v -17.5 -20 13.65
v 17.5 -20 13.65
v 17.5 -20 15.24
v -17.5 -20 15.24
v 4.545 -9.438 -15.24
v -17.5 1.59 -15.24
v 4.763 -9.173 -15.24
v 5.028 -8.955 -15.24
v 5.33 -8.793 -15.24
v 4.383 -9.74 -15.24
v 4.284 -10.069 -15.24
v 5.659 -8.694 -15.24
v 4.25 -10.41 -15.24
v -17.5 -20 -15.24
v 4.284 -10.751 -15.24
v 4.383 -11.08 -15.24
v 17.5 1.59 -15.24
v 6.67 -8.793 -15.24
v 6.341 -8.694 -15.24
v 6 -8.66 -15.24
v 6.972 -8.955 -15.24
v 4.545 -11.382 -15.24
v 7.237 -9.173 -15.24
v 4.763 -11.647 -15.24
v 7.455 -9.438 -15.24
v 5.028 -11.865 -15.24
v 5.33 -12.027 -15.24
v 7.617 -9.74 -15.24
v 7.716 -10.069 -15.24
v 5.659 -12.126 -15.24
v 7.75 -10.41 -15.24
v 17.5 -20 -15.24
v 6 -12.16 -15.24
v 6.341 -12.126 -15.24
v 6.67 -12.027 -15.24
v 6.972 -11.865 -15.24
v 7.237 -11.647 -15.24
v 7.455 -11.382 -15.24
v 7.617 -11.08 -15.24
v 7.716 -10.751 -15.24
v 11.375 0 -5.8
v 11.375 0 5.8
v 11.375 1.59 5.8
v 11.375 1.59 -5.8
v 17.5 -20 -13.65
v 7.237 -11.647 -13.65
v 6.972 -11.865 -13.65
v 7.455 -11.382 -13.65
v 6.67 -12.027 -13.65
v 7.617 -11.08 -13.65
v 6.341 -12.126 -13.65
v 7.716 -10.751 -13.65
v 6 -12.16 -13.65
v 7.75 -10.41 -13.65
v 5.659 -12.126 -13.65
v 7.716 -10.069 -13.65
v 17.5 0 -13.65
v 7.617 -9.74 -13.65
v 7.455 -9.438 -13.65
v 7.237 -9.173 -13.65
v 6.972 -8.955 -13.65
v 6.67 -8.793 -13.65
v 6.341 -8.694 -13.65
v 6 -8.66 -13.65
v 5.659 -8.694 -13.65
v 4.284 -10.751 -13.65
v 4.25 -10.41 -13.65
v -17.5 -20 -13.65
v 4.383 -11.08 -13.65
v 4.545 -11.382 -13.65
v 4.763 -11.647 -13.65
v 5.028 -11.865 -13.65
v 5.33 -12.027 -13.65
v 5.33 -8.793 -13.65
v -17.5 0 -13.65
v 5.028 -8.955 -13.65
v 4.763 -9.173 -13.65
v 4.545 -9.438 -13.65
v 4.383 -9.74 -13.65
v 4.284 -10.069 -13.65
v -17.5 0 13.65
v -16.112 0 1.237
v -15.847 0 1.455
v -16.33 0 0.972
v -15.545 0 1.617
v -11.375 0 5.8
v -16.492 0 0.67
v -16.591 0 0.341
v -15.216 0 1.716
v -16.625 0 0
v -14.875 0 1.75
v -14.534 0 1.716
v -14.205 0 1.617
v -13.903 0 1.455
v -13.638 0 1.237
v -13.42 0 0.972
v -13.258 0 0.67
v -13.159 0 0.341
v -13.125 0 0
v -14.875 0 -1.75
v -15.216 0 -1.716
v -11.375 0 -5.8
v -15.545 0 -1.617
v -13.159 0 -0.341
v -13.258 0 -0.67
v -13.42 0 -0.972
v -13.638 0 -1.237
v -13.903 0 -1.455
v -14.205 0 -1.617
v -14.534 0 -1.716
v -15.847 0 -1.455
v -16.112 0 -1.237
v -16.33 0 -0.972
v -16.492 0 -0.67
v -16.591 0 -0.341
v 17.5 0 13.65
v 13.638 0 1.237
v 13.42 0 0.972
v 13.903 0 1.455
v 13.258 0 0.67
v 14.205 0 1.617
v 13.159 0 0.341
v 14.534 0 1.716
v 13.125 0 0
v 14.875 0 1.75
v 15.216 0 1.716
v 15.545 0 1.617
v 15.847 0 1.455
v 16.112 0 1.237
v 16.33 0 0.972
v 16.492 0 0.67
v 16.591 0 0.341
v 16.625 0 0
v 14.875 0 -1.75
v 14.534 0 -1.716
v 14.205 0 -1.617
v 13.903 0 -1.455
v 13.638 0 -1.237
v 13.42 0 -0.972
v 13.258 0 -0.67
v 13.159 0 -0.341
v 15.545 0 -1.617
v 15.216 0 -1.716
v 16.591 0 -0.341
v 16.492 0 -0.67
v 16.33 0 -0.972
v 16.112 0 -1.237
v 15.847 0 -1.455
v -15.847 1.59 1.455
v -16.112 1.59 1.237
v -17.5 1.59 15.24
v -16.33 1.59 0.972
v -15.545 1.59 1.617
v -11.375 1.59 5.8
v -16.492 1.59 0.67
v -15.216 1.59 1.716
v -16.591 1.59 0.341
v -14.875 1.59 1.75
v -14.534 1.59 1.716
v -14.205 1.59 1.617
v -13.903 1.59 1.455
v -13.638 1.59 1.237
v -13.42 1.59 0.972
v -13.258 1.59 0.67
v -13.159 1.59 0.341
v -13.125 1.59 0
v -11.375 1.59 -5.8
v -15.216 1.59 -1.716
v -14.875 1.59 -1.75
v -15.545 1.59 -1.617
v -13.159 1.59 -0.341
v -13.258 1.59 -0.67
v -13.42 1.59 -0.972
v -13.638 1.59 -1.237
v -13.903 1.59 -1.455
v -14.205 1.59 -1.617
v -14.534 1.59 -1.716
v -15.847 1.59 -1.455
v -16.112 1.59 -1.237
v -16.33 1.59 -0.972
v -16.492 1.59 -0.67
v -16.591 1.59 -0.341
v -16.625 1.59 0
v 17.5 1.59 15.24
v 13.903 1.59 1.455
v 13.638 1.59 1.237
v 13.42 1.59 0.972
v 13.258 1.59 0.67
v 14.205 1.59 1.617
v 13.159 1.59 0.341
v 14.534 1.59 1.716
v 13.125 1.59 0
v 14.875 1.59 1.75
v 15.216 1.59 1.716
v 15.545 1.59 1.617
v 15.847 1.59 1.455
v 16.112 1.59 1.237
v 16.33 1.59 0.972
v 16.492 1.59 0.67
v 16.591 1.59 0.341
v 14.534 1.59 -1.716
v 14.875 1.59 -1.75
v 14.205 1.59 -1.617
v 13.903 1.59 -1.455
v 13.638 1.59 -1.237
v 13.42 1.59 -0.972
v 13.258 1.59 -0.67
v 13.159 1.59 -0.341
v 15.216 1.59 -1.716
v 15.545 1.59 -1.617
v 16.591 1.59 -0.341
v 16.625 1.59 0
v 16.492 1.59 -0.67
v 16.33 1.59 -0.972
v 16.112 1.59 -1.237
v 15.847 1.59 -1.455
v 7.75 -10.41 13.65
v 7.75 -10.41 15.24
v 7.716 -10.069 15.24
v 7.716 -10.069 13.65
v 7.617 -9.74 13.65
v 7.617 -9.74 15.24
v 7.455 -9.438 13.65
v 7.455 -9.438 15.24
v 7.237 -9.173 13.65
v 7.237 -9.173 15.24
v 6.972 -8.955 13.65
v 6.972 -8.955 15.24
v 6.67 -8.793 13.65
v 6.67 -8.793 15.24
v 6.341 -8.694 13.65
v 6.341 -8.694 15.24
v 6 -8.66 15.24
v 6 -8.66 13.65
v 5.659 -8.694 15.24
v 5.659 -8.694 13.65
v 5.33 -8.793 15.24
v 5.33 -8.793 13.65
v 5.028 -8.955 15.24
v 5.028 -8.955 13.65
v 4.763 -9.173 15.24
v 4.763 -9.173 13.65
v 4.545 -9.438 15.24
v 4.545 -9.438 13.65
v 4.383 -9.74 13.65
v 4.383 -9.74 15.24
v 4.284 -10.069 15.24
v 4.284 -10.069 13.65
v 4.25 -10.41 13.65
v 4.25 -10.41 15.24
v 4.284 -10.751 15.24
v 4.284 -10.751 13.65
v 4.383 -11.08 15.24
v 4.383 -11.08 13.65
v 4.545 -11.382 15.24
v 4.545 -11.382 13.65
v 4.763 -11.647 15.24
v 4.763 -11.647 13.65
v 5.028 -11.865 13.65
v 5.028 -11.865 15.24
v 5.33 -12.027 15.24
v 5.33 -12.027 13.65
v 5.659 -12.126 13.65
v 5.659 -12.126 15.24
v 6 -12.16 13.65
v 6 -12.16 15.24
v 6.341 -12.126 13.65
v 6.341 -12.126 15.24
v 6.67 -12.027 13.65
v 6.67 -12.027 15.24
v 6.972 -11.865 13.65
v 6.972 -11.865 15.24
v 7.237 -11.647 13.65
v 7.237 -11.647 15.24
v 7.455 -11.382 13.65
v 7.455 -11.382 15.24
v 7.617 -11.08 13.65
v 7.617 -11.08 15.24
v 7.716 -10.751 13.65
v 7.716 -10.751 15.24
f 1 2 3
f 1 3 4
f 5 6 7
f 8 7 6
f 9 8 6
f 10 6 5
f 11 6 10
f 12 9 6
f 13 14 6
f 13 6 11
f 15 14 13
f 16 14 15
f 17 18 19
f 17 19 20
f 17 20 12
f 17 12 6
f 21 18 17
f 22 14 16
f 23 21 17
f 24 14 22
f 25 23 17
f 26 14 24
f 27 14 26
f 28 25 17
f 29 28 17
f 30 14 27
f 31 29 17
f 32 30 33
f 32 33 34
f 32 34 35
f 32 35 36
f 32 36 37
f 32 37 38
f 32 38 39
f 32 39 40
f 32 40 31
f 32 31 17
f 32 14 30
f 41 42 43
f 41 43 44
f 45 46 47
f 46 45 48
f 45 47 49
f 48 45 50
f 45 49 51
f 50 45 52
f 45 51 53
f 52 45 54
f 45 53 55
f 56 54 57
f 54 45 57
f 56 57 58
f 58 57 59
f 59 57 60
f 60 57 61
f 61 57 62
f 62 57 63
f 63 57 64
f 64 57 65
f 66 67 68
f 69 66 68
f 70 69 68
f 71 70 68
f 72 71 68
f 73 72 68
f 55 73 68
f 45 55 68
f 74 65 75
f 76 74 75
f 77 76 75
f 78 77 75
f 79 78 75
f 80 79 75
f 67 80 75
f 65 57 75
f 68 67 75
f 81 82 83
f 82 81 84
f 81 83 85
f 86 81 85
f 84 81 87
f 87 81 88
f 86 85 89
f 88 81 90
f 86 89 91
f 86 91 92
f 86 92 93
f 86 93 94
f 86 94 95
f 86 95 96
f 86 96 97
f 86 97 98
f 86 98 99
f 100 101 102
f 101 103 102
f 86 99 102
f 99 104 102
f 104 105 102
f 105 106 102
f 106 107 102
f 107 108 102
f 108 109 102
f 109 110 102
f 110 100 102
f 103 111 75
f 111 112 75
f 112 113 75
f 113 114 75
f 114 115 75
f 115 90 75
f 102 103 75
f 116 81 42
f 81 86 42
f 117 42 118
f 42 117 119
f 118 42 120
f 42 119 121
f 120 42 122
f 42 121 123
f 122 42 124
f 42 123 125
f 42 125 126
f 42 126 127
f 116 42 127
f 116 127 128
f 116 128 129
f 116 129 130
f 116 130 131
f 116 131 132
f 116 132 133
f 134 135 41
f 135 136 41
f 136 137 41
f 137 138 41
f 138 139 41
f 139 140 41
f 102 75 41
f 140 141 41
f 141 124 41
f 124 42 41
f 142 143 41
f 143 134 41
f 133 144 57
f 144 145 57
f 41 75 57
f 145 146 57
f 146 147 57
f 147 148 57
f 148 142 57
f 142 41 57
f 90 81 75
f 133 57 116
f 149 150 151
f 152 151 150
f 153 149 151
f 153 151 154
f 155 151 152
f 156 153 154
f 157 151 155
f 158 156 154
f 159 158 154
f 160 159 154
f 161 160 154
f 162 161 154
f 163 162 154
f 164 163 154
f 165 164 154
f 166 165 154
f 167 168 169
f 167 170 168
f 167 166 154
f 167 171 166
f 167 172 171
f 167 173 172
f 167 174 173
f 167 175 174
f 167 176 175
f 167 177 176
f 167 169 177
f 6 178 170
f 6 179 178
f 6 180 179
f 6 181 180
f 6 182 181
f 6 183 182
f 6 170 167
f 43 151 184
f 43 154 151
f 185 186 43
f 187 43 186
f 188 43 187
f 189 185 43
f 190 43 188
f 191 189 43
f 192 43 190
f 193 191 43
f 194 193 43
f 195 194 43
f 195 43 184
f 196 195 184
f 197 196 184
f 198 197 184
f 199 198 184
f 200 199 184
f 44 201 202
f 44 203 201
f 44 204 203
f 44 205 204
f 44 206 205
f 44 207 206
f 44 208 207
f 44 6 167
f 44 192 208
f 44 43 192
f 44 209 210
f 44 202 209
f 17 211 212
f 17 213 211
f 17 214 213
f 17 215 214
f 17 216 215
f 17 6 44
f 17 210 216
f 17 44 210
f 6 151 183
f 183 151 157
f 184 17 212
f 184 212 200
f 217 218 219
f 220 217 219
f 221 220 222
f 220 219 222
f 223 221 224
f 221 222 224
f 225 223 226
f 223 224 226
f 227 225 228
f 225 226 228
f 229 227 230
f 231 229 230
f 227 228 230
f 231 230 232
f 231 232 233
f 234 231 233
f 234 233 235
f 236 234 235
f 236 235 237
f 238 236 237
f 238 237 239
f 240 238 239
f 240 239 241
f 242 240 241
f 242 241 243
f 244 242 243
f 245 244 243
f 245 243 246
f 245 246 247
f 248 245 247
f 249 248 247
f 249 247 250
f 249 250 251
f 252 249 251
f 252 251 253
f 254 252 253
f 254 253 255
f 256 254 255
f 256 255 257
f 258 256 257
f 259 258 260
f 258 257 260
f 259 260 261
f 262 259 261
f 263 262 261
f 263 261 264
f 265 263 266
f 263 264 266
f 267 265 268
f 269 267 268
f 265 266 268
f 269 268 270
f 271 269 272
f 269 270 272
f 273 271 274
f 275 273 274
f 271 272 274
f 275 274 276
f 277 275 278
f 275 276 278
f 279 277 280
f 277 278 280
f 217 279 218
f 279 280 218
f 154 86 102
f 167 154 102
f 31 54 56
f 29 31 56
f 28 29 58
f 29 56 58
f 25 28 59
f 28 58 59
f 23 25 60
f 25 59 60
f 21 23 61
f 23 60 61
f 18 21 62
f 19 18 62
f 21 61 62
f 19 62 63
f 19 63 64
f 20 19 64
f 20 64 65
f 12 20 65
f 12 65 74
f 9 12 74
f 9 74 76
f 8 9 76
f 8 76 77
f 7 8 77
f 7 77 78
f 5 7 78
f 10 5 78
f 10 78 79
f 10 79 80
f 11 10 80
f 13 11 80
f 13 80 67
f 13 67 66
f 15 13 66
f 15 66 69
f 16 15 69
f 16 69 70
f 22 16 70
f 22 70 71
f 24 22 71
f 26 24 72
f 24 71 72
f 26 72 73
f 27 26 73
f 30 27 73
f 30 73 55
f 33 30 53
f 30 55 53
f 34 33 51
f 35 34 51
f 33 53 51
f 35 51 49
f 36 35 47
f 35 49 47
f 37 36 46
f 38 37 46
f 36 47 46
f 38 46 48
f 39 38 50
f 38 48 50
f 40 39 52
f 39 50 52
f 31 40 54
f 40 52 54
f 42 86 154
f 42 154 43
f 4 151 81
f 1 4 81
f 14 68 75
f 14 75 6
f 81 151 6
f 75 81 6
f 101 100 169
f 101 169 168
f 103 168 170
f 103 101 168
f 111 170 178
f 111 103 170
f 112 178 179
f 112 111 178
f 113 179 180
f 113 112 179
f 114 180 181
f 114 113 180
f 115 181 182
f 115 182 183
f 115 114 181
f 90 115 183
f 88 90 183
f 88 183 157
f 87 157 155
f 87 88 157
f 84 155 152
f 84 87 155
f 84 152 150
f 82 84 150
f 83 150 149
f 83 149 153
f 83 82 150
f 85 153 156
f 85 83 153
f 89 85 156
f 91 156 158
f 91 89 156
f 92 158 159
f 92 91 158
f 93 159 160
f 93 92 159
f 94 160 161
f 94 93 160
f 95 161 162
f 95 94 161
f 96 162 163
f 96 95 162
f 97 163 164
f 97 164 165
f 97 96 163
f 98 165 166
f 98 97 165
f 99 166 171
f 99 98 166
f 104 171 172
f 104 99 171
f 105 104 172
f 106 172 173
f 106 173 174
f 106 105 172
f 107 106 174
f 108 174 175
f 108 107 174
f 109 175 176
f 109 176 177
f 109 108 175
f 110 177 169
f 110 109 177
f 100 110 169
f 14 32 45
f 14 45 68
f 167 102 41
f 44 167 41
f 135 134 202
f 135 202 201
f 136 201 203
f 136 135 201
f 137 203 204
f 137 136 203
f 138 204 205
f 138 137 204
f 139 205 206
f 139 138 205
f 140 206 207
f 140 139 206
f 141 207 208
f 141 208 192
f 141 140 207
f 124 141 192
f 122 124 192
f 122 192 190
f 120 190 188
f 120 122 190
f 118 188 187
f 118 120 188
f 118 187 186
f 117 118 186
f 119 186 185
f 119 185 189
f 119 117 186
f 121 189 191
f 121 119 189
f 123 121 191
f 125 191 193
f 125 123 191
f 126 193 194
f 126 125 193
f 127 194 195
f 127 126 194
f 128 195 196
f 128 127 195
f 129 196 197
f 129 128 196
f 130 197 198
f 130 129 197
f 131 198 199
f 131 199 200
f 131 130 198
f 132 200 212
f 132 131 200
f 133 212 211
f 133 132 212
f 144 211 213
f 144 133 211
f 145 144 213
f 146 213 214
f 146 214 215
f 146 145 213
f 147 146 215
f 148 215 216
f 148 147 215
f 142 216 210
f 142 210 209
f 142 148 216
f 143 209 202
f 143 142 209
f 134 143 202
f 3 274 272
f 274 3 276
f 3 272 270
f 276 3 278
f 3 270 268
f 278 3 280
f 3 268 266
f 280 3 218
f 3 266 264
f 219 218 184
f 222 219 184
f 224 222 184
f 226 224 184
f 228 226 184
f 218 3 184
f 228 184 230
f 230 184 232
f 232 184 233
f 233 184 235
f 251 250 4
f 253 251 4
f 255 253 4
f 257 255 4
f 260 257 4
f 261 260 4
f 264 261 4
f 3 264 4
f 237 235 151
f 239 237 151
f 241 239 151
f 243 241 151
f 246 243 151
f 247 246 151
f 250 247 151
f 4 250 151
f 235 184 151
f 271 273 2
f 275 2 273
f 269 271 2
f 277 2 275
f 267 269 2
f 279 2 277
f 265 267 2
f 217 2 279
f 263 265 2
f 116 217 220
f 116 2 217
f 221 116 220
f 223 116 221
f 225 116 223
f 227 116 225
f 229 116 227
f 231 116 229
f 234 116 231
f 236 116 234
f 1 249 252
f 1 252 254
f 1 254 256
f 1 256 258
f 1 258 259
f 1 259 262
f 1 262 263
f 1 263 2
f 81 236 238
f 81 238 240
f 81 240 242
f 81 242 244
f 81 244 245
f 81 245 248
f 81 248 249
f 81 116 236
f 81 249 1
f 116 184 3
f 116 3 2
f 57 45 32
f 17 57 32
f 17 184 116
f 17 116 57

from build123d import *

# Parameters (mm, degrees)
SKETCH1_W           = 45
SKETCH1_H           = 30.48
SKETCH1_R           = 1.75
SKETCH1_W_2         = 22.75
SKETCH1_H_2         = 11.6
BOSS_EXTRUDE1_DEPTH = 1.59
SKETCH3_W           = 45
SKETCH3_H           = 1.59
BOSS_EXTRUDE3_DEPTH = 20
SKETCH4_R           = 1.75
CUT_EXTRUDE2_DEPTH  = 40
SKETCH5_W           = 5
SKETCH5_H           = 30.48
CUT_EXTRUDE3_DEPTH  = 30


with BuildPart() as part:
    # Sketch1 → Boss-Extrude1 (new body)
    with BuildSketch(Plane(origin=(0, 0, 0), x_dir=(1, 0, 0), z_dir=(0, 1, 0))):
        Rectangle(SKETCH1_W, SKETCH1_H)
        with Locations(Location((-14.875, 0, 0), (0, 0, 90))):
            Circle(SKETCH1_R, mode=Mode.SUBTRACT)
        with Locations(Location((14.875, 0, 0), (0, 0, 90))):
            Circle(SKETCH1_R, mode=Mode.SUBTRACT)
        Rectangle(SKETCH1_W_2, SKETCH1_H_2, mode=Mode.SUBTRACT)
    extrude(amount=BOSS_EXTRUDE1_DEPTH)

    # Sketch3 → Boss-Extrude3 (add)
    with BuildSketch(Plane(origin=(0, 0, 0), x_dir=(-1, 0, 0), z_dir=(0, -1, 0))):
        with Locations((0, -14.445)):
            Rectangle(SKETCH3_W, SKETCH3_H)
        with Locations((0, 14.445)):
            Rectangle(SKETCH3_W, SKETCH3_H)
    extrude(amount=BOSS_EXTRUDE3_DEPTH)

    # Sketch4 → Cut-Extrude2 (cut)
    with BuildSketch(Plane.XY.offset(15.24)):
        with Locations((6, -10.41)):
            Circle(SKETCH4_R)
    extrude(amount=-CUT_EXTRUDE2_DEPTH, mode=Mode.SUBTRACT)

    # Sketch5 → Cut-Extrude3 (cut)
    with BuildSketch(Plane(origin=(0, 1.59, 0), x_dir=(1, 0, 0), z_dir=(0, 1, 0))):
        with Locations((-20, 0)):
            Rectangle(SKETCH5_W, SKETCH5_H)
        with Locations((20, 0)):
            Rectangle(SKETCH5_W, SKETCH5_H)
    extrude(amount=-CUT_EXTRUDE3_DEPTH, mode=Mode.SUBTRACT)


solid = part.part
